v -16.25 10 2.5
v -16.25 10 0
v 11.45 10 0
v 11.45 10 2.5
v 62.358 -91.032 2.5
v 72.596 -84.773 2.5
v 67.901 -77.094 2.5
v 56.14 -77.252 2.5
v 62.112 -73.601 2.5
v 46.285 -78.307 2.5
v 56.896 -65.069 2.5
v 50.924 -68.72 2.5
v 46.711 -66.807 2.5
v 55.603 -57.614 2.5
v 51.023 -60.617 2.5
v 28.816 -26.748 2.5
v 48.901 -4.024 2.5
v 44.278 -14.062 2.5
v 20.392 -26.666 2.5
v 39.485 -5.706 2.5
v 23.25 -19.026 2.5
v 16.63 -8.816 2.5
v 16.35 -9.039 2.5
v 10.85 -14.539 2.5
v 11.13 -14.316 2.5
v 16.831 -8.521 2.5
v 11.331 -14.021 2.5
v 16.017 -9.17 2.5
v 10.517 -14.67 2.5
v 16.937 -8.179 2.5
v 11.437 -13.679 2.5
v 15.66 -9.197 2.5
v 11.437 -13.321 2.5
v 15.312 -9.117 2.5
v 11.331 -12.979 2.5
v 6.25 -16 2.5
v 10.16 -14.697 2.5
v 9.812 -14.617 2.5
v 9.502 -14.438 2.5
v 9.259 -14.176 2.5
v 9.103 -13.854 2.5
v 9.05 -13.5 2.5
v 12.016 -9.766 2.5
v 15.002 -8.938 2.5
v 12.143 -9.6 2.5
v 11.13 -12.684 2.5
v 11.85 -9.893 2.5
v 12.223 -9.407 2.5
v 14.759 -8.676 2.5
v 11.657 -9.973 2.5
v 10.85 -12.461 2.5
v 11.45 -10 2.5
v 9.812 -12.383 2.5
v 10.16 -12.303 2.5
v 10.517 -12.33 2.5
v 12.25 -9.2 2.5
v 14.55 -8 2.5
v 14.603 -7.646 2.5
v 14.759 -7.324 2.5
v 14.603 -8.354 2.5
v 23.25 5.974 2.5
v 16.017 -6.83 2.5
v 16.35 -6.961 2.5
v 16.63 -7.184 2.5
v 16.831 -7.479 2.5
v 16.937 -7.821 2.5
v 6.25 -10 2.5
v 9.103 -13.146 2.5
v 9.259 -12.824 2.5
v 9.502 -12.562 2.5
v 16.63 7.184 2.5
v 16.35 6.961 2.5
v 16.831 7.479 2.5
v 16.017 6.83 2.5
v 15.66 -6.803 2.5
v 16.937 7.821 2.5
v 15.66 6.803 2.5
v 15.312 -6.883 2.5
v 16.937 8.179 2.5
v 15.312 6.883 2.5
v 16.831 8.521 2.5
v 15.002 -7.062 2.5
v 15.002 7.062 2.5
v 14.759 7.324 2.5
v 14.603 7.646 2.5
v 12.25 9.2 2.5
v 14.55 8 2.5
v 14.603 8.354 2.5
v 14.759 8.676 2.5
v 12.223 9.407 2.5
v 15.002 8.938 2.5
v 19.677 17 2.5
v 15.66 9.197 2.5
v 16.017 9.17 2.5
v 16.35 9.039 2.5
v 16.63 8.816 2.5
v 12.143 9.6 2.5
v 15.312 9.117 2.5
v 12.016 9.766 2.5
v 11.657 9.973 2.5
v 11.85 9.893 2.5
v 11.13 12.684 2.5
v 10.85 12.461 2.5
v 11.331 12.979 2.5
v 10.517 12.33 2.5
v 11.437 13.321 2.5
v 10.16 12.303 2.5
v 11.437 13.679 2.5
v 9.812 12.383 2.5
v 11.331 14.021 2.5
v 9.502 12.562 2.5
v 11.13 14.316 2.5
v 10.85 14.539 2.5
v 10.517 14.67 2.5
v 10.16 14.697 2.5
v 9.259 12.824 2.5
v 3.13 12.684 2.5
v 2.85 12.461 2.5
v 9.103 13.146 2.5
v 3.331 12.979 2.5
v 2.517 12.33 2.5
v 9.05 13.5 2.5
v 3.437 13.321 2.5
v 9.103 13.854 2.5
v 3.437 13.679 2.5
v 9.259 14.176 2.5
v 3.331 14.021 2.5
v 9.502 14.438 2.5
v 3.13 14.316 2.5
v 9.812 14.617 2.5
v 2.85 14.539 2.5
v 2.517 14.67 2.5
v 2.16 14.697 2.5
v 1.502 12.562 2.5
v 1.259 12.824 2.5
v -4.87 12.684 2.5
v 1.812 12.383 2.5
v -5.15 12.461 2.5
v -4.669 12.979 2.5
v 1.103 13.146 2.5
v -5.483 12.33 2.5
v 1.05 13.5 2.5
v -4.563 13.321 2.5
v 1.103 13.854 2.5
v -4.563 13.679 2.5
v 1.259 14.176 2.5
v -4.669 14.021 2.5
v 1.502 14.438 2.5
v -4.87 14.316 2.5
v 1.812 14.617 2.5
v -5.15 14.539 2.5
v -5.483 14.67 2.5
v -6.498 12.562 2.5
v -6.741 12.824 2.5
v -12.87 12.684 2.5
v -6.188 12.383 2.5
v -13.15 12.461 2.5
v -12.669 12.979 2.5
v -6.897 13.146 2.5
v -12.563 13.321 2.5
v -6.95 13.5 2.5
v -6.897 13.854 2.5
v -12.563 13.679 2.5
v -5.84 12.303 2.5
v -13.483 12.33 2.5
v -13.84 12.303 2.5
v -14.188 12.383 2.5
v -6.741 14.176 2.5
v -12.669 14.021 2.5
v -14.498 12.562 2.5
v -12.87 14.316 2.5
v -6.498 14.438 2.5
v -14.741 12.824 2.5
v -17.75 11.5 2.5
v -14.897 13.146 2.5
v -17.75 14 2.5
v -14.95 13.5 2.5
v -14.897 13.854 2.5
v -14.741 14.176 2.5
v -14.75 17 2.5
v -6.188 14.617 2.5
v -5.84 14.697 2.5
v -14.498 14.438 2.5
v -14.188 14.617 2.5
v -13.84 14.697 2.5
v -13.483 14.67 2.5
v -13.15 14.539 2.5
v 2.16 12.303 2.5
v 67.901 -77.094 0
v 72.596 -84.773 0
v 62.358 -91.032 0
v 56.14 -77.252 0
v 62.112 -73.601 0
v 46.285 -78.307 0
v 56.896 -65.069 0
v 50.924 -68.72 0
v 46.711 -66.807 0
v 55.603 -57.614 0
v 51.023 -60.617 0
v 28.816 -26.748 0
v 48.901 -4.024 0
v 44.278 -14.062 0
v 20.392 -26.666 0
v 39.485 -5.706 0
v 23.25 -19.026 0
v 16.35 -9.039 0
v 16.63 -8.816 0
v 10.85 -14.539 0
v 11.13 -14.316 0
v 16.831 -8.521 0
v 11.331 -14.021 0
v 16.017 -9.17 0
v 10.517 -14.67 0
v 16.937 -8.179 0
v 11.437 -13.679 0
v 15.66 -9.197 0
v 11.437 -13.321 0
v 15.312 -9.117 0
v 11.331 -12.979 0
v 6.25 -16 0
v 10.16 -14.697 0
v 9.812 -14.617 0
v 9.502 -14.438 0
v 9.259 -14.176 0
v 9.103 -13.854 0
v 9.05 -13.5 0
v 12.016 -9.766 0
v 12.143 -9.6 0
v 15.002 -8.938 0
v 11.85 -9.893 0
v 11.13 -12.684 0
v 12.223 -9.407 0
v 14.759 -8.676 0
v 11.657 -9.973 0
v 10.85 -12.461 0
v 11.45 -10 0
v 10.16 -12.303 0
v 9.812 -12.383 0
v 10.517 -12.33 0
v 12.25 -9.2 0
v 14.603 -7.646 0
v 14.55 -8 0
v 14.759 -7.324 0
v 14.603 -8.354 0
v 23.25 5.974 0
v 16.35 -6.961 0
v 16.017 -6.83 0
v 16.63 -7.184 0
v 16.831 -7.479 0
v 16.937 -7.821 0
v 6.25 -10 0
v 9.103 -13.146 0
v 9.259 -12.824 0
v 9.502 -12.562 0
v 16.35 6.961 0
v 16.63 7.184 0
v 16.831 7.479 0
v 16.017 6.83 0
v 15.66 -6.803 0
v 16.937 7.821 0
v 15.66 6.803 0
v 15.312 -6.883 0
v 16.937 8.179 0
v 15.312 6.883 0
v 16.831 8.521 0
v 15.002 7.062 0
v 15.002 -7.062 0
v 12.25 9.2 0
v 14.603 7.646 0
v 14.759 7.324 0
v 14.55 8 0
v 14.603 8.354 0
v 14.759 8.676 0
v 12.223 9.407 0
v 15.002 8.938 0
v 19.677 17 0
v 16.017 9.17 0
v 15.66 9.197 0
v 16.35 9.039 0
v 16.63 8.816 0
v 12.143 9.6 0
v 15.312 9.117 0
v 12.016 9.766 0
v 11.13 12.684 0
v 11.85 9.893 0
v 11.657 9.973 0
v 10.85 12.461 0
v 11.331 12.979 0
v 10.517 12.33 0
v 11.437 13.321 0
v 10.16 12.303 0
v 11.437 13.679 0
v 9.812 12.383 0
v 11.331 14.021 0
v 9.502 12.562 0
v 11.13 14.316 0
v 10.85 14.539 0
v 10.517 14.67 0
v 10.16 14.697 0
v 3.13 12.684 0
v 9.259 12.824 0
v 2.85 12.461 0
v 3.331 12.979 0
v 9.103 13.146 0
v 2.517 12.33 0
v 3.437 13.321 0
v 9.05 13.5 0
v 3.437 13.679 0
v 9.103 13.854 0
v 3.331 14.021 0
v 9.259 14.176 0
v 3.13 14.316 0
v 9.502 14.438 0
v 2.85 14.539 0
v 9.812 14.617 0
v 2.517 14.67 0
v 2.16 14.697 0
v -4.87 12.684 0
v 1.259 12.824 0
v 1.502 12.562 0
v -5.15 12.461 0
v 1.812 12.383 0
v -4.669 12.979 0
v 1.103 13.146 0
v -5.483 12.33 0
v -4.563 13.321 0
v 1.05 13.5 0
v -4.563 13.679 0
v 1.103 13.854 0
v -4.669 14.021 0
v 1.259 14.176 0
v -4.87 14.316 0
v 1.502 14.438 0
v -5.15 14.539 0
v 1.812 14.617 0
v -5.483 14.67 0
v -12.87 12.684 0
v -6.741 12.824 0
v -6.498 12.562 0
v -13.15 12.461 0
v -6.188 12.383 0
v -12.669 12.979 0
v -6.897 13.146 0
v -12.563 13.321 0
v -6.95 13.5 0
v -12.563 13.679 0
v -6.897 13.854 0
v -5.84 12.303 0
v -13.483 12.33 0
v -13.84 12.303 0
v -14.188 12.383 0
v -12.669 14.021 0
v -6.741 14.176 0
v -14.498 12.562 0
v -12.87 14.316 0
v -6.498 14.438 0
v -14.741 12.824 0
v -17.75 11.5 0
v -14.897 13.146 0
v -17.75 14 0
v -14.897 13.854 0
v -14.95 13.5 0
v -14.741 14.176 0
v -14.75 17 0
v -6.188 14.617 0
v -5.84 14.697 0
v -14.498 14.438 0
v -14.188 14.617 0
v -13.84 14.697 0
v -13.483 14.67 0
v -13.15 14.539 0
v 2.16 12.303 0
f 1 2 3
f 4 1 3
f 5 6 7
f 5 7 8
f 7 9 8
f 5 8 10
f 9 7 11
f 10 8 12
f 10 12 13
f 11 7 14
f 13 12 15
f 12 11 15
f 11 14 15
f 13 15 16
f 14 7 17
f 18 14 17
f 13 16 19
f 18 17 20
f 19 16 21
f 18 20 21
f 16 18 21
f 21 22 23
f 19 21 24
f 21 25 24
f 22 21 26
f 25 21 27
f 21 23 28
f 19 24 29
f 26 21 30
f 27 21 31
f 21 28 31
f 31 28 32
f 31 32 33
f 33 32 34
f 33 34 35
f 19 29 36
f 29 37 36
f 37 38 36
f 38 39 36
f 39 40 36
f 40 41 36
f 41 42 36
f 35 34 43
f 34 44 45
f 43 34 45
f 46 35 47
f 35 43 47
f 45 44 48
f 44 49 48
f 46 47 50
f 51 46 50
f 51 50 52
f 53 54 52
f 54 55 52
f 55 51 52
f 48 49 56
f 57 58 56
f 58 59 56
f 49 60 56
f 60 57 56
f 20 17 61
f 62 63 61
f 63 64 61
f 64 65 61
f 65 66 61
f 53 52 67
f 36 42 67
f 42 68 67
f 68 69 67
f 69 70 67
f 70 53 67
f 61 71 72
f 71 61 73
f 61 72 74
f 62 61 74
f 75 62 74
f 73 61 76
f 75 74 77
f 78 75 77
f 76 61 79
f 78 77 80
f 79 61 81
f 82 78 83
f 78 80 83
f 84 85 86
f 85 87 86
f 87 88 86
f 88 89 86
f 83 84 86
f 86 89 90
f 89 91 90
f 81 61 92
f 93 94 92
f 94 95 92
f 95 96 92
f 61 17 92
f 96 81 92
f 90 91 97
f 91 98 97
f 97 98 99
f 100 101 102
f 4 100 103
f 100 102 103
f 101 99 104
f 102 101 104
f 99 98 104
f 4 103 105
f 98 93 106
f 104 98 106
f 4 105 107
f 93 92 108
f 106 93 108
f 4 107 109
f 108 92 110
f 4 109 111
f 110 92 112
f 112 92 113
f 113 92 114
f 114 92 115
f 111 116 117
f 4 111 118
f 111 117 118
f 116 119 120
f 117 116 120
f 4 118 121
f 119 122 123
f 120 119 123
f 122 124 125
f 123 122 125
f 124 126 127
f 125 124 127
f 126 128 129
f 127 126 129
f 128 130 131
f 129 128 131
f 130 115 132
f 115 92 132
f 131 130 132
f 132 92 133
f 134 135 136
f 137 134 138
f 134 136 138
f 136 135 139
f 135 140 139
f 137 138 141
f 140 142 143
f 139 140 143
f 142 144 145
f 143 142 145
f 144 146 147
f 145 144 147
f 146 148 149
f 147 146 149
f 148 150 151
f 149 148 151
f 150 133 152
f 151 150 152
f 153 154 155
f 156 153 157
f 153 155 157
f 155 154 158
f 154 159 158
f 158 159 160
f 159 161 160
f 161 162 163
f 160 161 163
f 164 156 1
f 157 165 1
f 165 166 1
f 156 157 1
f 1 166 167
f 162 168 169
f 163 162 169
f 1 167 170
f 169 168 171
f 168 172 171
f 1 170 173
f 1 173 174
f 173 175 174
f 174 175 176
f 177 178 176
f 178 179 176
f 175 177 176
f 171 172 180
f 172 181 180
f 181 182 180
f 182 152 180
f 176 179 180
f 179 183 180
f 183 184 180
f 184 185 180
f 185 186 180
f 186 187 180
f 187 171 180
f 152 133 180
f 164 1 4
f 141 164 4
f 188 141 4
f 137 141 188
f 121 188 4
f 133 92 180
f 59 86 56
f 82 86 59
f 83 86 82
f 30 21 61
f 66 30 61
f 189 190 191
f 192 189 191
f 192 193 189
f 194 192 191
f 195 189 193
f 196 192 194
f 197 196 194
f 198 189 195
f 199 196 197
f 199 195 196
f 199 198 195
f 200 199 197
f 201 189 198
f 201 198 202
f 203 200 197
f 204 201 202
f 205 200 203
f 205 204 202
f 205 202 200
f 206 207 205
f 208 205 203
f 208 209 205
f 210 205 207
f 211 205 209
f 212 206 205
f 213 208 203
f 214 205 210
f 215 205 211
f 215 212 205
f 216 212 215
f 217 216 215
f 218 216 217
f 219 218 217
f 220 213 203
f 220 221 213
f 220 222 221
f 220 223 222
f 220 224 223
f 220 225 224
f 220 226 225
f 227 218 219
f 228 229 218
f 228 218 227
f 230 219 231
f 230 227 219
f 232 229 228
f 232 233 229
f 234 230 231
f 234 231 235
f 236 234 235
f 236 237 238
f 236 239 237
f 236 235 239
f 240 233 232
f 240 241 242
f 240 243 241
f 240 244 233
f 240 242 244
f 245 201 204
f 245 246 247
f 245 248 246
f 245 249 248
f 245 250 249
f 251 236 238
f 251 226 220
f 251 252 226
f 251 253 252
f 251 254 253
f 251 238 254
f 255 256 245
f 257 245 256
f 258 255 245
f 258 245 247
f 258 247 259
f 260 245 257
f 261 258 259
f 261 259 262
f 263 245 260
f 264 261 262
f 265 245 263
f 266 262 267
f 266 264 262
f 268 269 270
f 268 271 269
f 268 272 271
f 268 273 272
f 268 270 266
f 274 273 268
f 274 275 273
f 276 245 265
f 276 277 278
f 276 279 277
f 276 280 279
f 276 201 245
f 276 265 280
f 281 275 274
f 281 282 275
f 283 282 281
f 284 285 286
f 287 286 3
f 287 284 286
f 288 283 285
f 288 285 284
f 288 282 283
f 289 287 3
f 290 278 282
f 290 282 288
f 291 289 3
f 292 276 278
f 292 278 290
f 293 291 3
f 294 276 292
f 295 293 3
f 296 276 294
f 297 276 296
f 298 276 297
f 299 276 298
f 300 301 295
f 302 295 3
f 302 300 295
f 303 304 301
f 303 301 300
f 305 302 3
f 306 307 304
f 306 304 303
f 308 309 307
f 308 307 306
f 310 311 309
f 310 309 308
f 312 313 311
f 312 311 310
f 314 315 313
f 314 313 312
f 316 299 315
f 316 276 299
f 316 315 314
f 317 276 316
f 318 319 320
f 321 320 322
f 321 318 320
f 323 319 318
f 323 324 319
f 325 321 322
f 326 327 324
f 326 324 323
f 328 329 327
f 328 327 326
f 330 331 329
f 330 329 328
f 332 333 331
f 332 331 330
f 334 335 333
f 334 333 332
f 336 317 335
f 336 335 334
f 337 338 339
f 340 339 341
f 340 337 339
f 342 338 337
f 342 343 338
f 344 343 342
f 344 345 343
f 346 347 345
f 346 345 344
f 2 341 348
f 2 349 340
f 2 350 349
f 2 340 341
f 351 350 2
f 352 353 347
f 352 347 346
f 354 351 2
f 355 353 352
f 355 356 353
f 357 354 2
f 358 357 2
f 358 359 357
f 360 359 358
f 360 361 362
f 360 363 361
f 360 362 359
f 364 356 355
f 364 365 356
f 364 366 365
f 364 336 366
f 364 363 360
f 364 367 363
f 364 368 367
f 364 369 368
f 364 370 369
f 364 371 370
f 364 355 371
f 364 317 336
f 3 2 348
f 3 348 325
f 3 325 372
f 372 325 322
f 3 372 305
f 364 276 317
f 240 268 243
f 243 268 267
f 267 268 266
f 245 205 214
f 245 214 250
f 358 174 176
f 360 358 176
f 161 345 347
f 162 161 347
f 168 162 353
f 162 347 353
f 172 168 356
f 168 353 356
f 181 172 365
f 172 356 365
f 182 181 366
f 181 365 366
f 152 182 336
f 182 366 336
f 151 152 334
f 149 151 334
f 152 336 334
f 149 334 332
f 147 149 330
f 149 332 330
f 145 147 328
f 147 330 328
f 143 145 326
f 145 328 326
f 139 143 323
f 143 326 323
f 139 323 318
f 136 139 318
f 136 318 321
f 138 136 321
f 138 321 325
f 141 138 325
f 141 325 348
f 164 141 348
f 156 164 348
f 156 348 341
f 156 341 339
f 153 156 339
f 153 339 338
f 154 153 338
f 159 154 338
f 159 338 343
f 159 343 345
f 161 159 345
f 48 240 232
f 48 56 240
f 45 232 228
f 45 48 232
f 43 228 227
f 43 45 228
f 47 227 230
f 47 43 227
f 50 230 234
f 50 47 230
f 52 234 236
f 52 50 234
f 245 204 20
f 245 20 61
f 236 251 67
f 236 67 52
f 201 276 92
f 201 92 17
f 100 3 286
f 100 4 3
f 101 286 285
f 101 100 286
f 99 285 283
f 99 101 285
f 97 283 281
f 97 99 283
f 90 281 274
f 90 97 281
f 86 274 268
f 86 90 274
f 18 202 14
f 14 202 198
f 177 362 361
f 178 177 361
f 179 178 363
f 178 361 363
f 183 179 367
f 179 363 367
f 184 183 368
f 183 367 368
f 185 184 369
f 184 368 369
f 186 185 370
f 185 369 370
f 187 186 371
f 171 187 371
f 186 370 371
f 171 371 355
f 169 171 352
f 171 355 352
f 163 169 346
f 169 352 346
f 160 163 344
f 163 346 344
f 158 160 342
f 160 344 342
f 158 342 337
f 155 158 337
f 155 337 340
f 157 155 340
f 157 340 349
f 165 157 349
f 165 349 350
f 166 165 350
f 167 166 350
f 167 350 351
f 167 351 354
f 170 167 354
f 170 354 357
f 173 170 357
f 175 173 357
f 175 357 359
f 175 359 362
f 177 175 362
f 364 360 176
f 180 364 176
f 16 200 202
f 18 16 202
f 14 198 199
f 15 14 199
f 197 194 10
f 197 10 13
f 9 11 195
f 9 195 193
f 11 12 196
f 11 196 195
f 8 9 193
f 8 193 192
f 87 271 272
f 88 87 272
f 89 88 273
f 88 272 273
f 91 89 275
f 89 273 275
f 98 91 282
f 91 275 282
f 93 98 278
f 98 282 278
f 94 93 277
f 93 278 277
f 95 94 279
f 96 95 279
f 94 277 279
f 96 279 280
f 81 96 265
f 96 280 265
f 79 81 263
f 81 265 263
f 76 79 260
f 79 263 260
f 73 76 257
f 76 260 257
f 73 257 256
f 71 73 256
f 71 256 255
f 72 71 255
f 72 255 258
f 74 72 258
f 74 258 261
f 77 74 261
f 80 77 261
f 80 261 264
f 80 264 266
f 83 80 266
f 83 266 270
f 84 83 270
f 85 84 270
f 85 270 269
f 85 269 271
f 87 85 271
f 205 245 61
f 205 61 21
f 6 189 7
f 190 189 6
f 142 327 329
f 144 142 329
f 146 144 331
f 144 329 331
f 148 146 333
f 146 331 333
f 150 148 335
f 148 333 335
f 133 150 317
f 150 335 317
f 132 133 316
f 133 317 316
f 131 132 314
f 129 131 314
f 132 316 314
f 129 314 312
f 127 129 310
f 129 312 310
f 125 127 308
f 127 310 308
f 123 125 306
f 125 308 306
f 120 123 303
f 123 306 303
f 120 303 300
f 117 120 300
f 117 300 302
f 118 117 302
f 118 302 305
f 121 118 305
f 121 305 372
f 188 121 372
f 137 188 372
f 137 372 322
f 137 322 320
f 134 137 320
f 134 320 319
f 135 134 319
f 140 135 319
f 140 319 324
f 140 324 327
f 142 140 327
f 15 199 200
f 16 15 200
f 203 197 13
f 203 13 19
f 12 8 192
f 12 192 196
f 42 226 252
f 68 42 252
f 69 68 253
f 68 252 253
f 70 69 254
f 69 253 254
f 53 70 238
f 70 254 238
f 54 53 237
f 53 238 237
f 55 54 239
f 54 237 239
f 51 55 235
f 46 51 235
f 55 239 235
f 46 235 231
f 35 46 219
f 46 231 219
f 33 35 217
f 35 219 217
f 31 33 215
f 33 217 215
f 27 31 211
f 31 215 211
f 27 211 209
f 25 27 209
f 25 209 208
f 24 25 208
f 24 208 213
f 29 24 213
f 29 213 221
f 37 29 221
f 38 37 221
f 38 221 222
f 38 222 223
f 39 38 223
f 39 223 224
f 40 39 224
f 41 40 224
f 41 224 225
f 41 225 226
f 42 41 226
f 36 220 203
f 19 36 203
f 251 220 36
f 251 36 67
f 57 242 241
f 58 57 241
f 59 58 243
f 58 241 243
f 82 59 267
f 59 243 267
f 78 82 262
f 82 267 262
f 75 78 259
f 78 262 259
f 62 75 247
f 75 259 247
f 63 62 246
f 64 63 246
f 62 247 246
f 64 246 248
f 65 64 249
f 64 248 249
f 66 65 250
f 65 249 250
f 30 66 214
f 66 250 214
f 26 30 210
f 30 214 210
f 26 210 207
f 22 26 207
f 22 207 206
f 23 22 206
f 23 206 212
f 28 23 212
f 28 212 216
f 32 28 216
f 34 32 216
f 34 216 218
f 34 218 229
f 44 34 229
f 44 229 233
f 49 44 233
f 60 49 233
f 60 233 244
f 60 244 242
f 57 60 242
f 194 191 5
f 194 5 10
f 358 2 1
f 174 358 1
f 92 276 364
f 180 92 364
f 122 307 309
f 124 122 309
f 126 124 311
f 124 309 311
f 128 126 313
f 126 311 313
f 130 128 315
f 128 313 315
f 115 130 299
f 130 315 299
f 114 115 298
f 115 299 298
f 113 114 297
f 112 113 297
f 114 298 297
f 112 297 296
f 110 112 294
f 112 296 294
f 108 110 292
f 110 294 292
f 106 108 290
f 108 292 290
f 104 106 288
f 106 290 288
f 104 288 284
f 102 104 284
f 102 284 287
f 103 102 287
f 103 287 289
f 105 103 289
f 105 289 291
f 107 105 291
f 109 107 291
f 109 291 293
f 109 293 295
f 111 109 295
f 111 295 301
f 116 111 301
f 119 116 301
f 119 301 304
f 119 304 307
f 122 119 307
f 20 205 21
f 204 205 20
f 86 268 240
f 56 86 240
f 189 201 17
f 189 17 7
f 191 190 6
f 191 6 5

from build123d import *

# Parameters (mm, degrees)
ESQUISSE1_W             = 6
ESQUISSE1_H             = 6
BOSS_EXTRU_1_DEPTH      = 2.5
D_GAGEMENT_M21_D        = 2.4
CHANFREIN1_SIZE         = 1.5
CHANFREIN2_SIZE         = 3
CONG_3_R                = 0.8
ENL_V_MAT_EXTRU_1_REACH = 4.5


with BuildPart() as part:
    # Esquisse1 → Boss.-Extru.1 (new body)
    with BuildSketch(Plane.XY):
        Polygon((19.677471167, 17), (48.900602827, -4.024), (67.901253291, -77.094002614), (72.595795313, -84.772627178), (62.357629227, -91.032016541), (46.285412403, -78.306693506), (46.71123265, -66.806693506), (20.391821523, -26.665834049), align=None)
        Polygon((51.023072953, -60.616622474), (28.816069815, -26.747772307), (44.278044238, -14.062058021), (55.602935243, -57.613715208), align=None, mode=Mode.SUBTRACT)
        Polygon((39.485073144, -5.706221012), (23.25, 5.973778988), (23.25, -19.026221012), align=None, mode=Mode.SUBTRACT)
        Polygon((12.25, 17), (12.25, 10), (12.25, -10), (12.25, -16), (6.25, -16), (20.391821523, -26.665834049), (19.677471167, 17), align=None)
        with Locations((9.25, -13)):
            Rectangle(ESQUISSE1_W, ESQUISSE1_H)
        Polygon((12.25, 17), (12.25, 10), (-12.25, 10), (-17.75, 10), (-17.75, 17), align=None)
    extrude(amount=BOSS_EXTRU_1_DEPTH)

    # Dégagement M21 (through all)
    with Locations(Plane.XY.offset(2.5)):
        with Locations((-13.75, 13.5), (-5.75, 13.5), (2.25, 13.5), (10.25, 13.5), (15.75, 8), (15.75, -8), (10.25, -13.5)):
            Hole(D_GAGEMENT_M21_D / 2)

    # Chanfrein1
    chanfrein1_edges = [part.edges().sort_by_distance(p)[0] for p in [
        (-17.75, 10, 1.25),
    ]]
    chamfer(chanfrein1_edges, length=CHANFREIN1_SIZE)

    # Chanfrein2
    chanfrein2_edges = [part.edges().sort_by_distance(p)[0] for p in [
        (-17.75, 17, 1.25),
    ]]
    chamfer(chanfrein2_edges, length=CHANFREIN2_SIZE)

    # Congé3
    cong_3_edges = [part.edges().sort_by_distance(p)[0] for p in [
        (12.25, -10, 1.25),
        (12.25, 10, 1.25),
    ]]
    fillet(cong_3_edges, radius=CONG_3_R)

    # Esquisse6 → Enlèv. mat.-Extru.1 (cut, up to next)
    with BuildSketch(Plane.XY.offset(2.5), mode=Mode.PRIVATE) as enl_v_mat_extru_1_sk1:
        Polygon((50.923621455, -68.720394376), (56.895885005, -65.069083914), (62.112042808, -73.600888985), (56.139779258, -77.252199447), align=None)
    enl_v_mat_extru_1_tool1 = extrude(enl_v_mat_extru_1_sk1.sketch, amount=-ENL_V_MAT_EXTRU_1_REACH, mode=Mode.PRIVATE) & part.part
    add(enl_v_mat_extru_1_tool1.solids().sort_by_distance((56.517832, -71.160642, 2.5))[0], mode=Mode.SUBTRACT)


solid = part.part
